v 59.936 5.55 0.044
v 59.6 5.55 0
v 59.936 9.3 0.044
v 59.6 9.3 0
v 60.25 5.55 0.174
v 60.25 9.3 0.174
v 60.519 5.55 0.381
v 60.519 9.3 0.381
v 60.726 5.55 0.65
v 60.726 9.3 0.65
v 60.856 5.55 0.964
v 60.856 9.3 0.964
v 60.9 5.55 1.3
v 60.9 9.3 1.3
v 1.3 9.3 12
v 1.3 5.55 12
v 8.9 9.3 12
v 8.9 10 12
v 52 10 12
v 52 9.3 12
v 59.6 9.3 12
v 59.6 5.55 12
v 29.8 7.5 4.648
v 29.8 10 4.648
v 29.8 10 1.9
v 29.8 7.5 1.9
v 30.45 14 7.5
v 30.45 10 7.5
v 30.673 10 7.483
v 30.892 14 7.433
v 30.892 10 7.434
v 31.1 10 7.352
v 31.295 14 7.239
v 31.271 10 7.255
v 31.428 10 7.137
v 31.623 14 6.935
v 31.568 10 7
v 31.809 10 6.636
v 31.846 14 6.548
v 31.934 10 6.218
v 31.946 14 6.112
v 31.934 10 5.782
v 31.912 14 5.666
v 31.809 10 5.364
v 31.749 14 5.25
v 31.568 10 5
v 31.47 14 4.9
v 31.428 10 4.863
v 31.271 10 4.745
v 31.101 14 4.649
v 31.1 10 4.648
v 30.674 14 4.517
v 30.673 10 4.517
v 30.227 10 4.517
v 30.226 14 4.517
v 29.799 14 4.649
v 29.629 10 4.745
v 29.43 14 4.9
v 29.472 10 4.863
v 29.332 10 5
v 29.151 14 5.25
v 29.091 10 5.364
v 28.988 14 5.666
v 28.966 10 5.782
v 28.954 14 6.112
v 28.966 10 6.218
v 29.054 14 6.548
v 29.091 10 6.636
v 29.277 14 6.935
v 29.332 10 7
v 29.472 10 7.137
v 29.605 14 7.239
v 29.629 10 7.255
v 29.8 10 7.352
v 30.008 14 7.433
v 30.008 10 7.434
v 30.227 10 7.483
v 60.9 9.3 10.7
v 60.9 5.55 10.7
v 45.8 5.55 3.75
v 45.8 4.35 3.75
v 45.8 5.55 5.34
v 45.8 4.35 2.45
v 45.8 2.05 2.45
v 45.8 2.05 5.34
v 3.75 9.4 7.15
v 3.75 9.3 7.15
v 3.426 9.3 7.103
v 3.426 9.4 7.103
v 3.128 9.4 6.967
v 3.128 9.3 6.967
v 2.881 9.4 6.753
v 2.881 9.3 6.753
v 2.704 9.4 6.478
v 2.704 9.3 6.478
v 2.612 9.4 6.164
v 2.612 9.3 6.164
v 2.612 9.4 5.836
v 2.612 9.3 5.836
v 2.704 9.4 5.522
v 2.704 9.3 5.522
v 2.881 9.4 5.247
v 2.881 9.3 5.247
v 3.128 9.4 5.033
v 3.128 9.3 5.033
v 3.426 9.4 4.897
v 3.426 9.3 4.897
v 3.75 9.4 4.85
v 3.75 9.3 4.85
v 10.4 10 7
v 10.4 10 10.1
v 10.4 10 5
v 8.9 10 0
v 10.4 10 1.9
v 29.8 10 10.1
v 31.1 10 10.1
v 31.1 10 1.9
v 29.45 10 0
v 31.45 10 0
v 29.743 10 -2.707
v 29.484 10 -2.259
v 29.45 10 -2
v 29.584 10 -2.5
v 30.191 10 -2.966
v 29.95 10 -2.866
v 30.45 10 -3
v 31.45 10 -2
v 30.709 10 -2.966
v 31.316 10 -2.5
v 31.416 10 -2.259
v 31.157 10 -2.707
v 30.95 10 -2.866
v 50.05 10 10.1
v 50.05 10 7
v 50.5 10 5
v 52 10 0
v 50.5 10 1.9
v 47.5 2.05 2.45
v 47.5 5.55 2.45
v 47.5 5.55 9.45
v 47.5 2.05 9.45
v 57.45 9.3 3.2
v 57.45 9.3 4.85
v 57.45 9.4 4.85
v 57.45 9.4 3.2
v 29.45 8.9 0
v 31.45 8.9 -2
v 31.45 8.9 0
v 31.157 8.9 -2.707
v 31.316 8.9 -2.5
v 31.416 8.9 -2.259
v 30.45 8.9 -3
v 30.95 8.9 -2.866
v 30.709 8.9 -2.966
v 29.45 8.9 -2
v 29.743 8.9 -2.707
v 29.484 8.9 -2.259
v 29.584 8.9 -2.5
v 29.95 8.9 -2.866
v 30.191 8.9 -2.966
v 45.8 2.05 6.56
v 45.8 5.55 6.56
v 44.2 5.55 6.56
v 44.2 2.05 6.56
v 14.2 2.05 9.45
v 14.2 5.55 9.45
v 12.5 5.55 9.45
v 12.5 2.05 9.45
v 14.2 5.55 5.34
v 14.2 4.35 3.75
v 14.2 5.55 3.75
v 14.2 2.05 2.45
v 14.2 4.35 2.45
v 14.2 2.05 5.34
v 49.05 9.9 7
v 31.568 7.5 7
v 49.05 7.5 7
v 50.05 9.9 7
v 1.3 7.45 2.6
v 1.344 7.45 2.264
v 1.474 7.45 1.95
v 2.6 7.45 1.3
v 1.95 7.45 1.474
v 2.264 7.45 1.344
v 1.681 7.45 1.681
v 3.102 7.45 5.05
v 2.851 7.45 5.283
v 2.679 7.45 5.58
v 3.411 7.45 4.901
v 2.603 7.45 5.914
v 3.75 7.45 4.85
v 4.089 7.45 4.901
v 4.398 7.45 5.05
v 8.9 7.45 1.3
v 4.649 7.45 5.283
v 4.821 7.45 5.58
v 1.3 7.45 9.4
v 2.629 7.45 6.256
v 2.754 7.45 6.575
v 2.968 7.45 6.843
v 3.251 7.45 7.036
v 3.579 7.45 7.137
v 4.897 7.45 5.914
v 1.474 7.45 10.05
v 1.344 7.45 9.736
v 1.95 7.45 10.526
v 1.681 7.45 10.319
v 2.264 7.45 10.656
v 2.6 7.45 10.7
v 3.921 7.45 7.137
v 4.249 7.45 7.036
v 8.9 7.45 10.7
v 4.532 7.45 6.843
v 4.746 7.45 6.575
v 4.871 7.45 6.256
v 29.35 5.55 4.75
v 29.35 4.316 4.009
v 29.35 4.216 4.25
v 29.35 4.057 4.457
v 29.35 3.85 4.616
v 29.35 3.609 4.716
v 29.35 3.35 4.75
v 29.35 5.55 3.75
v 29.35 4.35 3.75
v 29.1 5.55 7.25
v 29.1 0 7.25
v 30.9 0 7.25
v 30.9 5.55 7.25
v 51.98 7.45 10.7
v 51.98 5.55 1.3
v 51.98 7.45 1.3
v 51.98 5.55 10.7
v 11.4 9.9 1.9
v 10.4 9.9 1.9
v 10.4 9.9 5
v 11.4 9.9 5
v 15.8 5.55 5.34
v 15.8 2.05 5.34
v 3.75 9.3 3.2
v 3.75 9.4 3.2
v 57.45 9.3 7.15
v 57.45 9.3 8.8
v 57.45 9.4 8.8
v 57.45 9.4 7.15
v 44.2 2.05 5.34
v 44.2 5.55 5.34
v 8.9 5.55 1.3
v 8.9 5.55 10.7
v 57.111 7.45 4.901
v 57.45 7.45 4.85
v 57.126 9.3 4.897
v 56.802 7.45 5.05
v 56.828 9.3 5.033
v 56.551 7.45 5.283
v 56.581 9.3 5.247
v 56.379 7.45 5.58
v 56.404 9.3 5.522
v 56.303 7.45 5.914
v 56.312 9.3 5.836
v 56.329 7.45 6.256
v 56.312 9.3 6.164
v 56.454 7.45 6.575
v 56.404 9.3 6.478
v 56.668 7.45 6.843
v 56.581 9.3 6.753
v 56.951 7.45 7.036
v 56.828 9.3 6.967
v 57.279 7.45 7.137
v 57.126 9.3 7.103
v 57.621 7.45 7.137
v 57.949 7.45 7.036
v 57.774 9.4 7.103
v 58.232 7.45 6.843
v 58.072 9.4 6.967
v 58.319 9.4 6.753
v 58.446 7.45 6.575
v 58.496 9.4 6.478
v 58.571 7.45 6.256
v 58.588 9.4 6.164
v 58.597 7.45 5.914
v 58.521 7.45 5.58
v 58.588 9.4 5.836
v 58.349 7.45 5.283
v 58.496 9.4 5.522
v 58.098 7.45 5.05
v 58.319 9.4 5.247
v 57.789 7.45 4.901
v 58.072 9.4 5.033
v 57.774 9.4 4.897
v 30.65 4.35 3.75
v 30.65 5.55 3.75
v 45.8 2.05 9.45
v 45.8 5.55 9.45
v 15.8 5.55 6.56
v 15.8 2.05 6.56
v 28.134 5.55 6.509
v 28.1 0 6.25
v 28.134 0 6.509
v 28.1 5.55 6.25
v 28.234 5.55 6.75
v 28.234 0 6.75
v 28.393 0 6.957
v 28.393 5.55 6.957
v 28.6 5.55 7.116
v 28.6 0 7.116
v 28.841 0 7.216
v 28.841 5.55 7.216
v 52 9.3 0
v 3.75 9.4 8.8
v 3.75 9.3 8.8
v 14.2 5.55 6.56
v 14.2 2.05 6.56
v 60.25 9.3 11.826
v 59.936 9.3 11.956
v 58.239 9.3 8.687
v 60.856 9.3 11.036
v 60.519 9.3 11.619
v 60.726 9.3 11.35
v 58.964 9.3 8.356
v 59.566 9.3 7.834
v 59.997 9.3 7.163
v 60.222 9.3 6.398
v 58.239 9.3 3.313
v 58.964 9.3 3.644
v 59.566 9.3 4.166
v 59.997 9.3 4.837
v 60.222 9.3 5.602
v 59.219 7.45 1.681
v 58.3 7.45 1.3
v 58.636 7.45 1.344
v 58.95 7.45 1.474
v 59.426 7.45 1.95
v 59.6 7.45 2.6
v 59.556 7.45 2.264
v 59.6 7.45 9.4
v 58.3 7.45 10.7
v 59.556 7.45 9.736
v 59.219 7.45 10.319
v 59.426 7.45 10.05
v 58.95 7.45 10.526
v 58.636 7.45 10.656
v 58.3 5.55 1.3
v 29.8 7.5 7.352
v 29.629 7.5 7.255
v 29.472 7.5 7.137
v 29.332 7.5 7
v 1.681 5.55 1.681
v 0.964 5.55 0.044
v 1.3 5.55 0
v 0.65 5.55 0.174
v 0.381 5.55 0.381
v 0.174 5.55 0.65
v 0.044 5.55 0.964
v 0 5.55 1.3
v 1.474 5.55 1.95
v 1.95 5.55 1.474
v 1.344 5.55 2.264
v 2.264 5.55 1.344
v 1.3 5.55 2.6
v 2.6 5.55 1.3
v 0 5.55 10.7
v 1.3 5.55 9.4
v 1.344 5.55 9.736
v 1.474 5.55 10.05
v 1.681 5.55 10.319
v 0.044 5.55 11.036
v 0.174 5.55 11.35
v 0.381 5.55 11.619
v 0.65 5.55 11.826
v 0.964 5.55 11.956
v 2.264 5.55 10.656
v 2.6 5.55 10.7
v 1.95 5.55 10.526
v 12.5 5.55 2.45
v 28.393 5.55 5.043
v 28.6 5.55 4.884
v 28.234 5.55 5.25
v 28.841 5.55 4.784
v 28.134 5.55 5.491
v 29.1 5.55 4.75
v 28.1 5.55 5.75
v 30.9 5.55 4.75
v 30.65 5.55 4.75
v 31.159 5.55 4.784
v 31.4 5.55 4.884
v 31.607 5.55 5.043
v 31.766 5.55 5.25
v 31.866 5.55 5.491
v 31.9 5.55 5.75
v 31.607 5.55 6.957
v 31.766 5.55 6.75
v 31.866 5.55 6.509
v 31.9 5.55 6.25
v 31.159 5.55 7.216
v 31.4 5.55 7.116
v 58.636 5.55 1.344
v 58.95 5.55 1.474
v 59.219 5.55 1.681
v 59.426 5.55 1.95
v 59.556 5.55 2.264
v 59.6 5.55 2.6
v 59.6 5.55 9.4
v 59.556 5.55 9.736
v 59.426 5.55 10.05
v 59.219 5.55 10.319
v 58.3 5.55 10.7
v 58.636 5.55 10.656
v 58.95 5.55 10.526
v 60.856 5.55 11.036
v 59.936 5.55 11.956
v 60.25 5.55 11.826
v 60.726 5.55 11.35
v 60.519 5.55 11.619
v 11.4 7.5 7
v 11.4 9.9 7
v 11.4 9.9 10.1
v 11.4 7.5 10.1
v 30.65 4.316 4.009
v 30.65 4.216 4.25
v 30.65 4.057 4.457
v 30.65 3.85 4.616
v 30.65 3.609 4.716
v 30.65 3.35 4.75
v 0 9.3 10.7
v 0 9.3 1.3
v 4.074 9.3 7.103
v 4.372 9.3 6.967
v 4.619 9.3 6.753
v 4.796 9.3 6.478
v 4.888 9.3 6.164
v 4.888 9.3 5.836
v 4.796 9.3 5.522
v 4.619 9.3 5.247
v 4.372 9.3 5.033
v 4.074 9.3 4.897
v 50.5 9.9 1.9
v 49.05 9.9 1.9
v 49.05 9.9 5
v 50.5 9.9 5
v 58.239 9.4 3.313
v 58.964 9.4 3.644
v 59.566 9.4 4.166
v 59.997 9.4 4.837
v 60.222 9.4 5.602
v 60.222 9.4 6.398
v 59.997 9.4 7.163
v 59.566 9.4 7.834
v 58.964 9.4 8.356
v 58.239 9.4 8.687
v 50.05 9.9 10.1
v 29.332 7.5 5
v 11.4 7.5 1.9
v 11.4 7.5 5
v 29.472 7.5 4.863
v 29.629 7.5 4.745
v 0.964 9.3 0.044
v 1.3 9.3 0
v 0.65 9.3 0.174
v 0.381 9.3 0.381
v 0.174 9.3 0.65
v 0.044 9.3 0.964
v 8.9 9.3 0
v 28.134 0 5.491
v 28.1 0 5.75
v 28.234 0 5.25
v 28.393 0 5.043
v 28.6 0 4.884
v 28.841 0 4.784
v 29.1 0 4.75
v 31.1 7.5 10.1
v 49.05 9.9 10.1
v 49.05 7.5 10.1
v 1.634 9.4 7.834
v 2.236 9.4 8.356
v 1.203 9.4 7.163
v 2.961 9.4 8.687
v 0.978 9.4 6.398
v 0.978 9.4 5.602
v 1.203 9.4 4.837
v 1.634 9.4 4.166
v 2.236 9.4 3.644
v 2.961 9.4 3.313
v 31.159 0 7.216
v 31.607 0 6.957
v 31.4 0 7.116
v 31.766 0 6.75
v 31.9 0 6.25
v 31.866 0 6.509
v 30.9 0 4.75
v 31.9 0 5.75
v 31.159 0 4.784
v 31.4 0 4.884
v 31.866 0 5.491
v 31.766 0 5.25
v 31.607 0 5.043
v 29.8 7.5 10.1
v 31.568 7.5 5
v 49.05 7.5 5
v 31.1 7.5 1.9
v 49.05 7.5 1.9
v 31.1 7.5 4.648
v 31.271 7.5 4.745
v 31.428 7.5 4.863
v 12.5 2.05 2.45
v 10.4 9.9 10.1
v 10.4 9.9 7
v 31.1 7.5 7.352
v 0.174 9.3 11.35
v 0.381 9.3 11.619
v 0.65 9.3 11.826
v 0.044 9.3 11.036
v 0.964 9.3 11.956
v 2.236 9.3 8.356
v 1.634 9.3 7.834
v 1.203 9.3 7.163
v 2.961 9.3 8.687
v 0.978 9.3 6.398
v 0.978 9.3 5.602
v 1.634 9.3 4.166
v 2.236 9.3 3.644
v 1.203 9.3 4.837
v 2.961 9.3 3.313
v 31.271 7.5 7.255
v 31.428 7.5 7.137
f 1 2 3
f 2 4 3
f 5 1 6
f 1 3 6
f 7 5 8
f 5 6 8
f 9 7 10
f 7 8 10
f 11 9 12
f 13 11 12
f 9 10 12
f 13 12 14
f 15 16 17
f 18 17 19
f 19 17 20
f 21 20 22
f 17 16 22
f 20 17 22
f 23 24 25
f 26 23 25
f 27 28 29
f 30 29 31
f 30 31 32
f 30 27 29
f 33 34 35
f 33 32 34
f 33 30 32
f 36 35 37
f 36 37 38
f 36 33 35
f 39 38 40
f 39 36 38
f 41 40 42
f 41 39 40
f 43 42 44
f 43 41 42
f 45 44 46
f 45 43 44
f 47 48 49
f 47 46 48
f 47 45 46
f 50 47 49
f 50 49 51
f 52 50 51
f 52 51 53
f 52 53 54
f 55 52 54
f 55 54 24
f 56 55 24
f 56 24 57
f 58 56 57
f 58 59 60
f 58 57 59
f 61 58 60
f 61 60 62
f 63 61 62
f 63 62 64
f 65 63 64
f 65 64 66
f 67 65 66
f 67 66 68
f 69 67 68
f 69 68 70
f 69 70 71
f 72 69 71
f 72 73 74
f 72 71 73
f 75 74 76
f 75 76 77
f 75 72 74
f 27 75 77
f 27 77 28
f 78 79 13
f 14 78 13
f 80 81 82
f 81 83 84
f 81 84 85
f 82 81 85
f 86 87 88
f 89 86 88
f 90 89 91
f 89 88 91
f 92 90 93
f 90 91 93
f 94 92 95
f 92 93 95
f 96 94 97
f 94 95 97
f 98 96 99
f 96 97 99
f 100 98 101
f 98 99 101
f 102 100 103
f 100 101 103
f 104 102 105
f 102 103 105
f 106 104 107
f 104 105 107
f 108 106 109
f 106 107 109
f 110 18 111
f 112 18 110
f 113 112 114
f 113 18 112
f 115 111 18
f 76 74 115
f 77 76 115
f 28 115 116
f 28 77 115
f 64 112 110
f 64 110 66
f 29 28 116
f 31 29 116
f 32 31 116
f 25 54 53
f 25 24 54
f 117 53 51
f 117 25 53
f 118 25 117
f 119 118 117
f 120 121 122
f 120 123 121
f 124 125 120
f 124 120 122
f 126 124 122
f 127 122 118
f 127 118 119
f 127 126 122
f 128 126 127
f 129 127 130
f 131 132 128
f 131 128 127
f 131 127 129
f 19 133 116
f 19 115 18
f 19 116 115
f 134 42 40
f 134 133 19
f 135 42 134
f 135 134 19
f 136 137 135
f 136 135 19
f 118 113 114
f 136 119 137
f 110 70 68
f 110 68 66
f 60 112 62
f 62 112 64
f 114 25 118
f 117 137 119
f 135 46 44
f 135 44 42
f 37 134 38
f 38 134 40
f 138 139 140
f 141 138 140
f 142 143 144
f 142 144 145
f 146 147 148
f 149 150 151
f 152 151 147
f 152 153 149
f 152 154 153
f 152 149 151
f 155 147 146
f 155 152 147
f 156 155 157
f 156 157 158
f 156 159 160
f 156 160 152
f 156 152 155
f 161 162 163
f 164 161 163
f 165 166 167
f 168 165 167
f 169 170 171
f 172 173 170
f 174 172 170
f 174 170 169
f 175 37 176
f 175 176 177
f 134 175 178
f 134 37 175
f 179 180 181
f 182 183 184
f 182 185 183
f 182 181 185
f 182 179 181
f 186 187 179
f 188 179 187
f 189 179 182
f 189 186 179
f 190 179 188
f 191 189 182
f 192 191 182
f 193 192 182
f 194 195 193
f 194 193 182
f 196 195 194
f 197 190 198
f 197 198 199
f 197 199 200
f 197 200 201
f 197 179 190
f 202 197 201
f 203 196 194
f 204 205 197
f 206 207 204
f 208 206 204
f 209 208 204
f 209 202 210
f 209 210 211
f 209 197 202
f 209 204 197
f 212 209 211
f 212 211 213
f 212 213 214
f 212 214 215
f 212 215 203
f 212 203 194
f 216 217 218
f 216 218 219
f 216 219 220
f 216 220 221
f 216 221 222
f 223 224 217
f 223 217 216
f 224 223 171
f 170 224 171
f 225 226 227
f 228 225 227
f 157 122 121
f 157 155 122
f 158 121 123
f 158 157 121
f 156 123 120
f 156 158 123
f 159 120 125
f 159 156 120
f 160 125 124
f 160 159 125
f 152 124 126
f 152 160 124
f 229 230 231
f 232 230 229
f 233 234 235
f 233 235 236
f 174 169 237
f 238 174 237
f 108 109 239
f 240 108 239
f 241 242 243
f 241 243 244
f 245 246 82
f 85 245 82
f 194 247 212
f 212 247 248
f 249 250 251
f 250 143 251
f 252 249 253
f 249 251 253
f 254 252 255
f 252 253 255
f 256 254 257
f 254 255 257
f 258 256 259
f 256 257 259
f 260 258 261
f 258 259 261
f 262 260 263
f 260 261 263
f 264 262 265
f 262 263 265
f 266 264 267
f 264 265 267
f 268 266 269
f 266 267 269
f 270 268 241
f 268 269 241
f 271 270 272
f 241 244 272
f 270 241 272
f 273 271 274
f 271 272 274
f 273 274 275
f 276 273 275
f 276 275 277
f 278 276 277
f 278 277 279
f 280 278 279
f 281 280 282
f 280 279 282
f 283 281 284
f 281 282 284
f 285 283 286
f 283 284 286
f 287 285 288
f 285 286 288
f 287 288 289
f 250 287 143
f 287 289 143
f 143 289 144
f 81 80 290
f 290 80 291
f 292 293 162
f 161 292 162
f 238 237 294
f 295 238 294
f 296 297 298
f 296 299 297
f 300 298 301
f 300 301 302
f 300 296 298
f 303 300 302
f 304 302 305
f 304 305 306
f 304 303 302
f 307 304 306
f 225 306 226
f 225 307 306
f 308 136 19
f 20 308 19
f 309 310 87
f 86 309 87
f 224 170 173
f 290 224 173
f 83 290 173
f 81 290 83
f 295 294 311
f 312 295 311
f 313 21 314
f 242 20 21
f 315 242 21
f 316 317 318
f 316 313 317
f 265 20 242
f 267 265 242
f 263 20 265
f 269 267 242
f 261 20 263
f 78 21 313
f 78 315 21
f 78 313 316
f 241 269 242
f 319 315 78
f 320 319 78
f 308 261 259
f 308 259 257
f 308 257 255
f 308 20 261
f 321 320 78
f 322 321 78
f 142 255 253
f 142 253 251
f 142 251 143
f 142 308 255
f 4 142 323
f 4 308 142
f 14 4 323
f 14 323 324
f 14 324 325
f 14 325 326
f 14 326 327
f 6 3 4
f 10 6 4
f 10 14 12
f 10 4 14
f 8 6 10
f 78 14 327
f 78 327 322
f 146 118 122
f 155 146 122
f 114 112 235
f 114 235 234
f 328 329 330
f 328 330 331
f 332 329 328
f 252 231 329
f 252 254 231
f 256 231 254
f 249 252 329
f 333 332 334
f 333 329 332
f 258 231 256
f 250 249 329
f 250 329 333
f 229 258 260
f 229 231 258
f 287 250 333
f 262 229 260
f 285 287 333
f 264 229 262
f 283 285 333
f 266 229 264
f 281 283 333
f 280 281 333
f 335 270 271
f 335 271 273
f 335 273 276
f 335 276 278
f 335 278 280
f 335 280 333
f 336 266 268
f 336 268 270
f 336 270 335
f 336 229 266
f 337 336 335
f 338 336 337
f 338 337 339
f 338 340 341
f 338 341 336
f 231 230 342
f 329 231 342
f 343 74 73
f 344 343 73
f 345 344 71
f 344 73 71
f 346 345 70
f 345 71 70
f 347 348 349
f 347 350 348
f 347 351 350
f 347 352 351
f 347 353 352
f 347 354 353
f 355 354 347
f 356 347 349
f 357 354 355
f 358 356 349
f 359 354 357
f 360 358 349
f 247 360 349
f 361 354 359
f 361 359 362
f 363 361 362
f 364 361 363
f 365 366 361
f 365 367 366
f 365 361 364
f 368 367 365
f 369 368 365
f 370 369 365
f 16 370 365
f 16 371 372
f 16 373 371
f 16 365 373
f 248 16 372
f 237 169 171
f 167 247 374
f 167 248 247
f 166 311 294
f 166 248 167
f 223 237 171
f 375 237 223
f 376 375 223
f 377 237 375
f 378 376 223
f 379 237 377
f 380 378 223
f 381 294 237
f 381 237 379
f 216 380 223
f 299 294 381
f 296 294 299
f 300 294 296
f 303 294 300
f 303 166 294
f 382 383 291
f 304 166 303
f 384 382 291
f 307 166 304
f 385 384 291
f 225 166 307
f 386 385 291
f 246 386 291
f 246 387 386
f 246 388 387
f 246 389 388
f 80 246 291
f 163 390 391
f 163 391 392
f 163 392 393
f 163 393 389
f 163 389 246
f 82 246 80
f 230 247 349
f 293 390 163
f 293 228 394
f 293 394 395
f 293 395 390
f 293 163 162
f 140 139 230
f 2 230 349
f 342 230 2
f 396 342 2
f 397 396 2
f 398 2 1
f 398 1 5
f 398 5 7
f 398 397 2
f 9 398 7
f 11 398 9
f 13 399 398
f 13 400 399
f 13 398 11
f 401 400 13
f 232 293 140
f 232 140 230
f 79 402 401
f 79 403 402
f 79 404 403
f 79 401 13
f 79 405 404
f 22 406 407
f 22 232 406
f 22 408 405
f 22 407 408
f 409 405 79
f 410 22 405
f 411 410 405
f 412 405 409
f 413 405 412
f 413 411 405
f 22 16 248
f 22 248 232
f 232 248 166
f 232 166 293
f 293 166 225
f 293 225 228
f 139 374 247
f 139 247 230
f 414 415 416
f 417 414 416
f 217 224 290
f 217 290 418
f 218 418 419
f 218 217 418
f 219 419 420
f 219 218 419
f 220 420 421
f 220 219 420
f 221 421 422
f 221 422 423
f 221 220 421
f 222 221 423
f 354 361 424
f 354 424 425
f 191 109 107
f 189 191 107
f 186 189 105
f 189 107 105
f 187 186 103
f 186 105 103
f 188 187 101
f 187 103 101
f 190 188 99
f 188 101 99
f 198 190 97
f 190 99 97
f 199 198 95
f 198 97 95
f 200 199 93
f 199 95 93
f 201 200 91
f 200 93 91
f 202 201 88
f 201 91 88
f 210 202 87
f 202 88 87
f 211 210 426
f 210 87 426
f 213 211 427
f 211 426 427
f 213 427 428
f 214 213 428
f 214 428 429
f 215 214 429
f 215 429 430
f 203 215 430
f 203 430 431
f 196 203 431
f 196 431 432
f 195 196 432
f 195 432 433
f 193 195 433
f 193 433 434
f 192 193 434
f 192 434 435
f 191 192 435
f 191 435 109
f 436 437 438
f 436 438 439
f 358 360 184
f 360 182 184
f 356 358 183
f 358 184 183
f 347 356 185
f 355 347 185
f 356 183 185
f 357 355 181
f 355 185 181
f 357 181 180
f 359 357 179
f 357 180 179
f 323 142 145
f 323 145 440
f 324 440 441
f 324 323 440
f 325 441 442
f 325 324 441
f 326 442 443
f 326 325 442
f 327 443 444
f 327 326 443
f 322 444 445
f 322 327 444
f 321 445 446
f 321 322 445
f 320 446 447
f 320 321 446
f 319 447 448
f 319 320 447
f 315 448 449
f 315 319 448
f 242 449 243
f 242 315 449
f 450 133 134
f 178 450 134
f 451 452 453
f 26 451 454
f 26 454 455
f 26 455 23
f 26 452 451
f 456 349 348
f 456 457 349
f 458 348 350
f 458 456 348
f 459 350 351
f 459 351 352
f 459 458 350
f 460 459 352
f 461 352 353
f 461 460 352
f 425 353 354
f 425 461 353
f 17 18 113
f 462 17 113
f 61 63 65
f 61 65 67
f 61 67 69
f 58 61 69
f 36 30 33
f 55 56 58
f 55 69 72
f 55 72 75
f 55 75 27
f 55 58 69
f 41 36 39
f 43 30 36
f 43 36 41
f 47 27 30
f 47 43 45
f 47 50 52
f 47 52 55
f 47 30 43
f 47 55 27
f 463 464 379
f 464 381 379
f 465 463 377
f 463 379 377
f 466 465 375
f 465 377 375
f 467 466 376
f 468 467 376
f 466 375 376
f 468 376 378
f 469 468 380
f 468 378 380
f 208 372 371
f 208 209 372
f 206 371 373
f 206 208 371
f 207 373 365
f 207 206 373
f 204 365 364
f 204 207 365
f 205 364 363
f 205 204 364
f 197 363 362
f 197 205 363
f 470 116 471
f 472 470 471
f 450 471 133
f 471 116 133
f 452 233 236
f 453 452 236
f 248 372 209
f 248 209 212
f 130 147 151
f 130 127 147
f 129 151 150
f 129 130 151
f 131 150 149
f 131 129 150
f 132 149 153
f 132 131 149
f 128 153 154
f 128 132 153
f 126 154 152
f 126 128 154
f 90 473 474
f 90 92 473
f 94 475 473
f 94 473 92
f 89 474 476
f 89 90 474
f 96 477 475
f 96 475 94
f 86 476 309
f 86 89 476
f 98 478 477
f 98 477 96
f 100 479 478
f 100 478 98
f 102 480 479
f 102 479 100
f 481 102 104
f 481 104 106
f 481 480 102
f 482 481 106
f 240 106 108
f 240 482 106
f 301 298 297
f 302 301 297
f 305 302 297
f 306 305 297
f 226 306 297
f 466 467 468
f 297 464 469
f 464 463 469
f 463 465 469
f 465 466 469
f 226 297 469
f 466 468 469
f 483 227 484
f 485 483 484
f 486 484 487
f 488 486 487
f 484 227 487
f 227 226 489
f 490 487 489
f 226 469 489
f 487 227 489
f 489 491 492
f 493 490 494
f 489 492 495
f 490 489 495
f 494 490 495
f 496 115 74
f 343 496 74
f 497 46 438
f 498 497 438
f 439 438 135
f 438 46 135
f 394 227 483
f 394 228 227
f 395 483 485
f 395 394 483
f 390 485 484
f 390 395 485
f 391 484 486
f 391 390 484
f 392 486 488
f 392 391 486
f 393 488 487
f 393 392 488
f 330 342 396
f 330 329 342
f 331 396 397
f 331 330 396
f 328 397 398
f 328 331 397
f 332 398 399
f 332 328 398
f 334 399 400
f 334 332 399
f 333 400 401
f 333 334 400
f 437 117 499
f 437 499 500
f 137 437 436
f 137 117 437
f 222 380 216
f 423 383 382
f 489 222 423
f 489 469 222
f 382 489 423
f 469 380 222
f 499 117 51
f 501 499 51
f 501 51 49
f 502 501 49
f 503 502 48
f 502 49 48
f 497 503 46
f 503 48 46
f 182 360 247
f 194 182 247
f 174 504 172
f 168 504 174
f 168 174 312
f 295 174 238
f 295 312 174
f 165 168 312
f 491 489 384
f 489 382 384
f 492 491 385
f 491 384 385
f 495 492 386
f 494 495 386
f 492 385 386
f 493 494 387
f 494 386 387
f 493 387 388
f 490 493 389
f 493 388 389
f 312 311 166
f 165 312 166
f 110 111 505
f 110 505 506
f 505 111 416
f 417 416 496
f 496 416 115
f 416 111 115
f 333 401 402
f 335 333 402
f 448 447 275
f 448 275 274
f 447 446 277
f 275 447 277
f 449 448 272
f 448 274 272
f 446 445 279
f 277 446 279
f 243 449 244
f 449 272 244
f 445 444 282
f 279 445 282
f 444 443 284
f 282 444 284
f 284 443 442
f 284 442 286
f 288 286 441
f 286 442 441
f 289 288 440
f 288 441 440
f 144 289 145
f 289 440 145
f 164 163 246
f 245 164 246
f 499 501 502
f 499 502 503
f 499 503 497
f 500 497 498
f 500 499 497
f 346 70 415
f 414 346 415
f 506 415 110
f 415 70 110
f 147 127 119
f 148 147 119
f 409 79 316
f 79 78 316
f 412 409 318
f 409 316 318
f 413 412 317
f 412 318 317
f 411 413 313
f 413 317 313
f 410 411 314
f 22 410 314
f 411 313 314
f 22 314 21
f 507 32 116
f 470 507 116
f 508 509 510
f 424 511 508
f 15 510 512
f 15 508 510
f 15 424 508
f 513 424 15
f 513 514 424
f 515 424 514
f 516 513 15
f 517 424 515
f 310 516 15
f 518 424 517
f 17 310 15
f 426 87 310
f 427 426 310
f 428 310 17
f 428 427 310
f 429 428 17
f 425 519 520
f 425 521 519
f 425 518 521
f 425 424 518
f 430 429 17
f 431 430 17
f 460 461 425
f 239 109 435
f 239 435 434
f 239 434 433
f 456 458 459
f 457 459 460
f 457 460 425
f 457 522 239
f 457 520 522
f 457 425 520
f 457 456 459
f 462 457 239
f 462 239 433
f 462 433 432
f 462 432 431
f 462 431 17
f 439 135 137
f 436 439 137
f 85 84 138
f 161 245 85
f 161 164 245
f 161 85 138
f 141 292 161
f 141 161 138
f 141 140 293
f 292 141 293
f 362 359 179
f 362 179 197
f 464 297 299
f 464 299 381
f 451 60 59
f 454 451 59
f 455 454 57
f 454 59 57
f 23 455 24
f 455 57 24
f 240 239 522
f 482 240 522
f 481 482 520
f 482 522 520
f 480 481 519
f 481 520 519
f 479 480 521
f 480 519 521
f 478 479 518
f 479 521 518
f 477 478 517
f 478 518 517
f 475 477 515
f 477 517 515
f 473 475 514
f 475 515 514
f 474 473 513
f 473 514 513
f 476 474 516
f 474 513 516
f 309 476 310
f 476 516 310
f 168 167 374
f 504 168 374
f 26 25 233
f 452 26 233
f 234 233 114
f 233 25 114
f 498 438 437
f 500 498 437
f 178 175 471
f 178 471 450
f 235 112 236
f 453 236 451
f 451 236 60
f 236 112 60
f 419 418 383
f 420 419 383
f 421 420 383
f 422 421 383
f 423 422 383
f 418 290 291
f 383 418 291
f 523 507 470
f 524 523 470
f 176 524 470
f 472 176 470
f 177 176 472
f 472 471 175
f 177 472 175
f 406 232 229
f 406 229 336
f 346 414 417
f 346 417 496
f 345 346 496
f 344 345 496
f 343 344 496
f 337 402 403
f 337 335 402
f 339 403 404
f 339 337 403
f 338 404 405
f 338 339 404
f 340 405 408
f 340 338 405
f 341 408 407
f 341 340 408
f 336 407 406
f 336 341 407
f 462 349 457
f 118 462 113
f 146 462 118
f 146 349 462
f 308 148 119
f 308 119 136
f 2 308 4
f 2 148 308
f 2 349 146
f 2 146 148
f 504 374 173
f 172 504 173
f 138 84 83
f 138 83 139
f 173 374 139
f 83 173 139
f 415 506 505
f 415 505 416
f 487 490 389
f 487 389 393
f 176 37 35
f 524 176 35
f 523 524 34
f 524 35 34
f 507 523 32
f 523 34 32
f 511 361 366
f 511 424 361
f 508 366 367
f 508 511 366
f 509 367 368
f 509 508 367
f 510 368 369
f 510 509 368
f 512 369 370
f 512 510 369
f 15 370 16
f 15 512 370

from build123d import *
from build123d.topology import SkipClean

# Parameters (mm, degrees)
CROQUIS1_W              = 60.9
CROQUIS1_H              = 12
SALIENTE_EXTRUIR1_DEPTH = 14
CROQUIS2_OUTSIDE_W      = 75.626
CROQUIS2_OUTSIDE_H      = 26.726
CROQUIS2_OUTSIDE_R      = 1.5
CORTAR_EXTRUIR1_DEPTH   = 4
SALIENTE_EXTRUIR3_DEPTH = 1.1
CROQUIS4_OUTSIDE_W      = 75.752
CROQUIS4_OUTSIDE_H      = 29.852
CORTAR_EXTRUIR2_DEPTH   = 0.7
CORTAR_EXTRUIR3_DEPTH   = 2.5
CROQUIS6_W              = 1.45
CROQUIS6_H              = 3.1
CROQUIS6_W_2            = 1
CORTAR_EXTRUIR4_DEPTH   = 0.1
REDONDEO1_R             = 1
REDONDEO2_R             = 1
SALIENTE_EXTRUIR4_DEPTH = 0.1
CORTAR_EXTRUIR5_REACH   = 64.764
CROQUIS8_R              = 1.15
CROQUIS9_OUTSIDE_W      = 75.752
CROQUIS9_OUTSIDE_H      = 29.852
CORTAR_EXTRUIR7_DEPTH   = 5.55
SALIENTE_EXTRUIR6_DEPTH = 3.5
CROQUIS12_W             = 31.6
CROQUIS12_H             = 1.3
CORTAR_EXTRUIR8_DEPTH   = 2.3
CROQUIS14_W             = 1.3
CROQUIS14_H             = 1
CORTAR_EXTRUIR9_DEPTH   = 2.3
REDONDEO3_R             = 1
CROQUIS15_W             = 7.62
CROQUIS15_H             = 9.4
CROQUIS15_W_2           = 7.6
CORTAR_EXTRUIR10_DEPTH  = 1.9
REDONDEO4_R             = 1.3
REDONDEO5_R             = 1.3
REDONDEO6_R             = 1.3
REDONDEO7_R             = 1


# Some blends are built 0.0001 mm under size
with BuildPart() as part:
    # Croquis1 → Saliente-Extruir1 (new body)
    with BuildSketch(Plane(origin=(0, 0, 0), x_dir=(1, 0, 0), z_dir=(0, 1, 0))):
        with Locations((30.45, -6)):
            Rectangle(CROQUIS1_W, CROQUIS1_H)
    extrude(amount=SALIENTE_EXTRUIR1_DEPTH)

    # Croquis2 outside → Cortar-Extruir1 (cut)
    with BuildSketch(Plane(origin=(0, 14, 0), x_dir=(1, 0, 0), z_dir=(0, 1, 0))):
        with Locations((30.45, -6)):
            Rectangle(CROQUIS2_OUTSIDE_W, CROQUIS2_OUTSIDE_H)
        with Locations(Location((30.45, -6, 0), (0, 0, 270))):
            Circle(CROQUIS2_OUTSIDE_R, mode=Mode.SUBTRACT)
    extrude(amount=-CORTAR_EXTRUIR1_DEPTH, mode=Mode.SUBTRACT)

    # Croquis3 → Saliente-Extruir3 (add)
    with BuildSketch(Plane(origin=(0, 10, 0), x_dir=(1, 0, 0), z_dir=(0, 1, 0))):
        Polygon((30.45, 0), (29.45, 0), (29.45, 3), (31.45, 3), (31.45, 0), align=None)
    extrude(amount=-SALIENTE_EXTRUIR3_DEPTH)

    # Croquis4 outside → Cortar-Extruir2 (cut)
    with BuildSketch(Plane(origin=(0, 10, 0), x_dir=(1, 0, 0), z_dir=(0, 1, 0))):
        with Locations((30.45, -4.5)):
            Rectangle(CROQUIS4_OUTSIDE_W, CROQUIS4_OUTSIDE_H)
        Polygon((8.9, -6), (8.9, 0), (29.45, 0), (29.45, 3), (31.45, 3), (31.45, 0), (52, 0), (52, -12), (8.9, -12), align=None, mode=Mode.SUBTRACT)
    extrude(amount=-CORTAR_EXTRUIR2_DEPTH, mode=Mode.SUBTRACT)

    # Croquis5 → Cortar-Extruir3 (cut)
    with SkipClean():  # the faces are left unmerged after this step: merging them gives an invalid solid
        with BuildSketch(Plane(origin=(0, 10, 0), x_dir=(1, 0, 0), z_dir=(0, 1, 0))):
            with BuildLine():
                ThreePointArc((29.331966011, -5), (29.548647819, -4.801015327), (29.8, -4.648149417))
                Line((29.8, -4.648149417), (29.8, -1.9))
                Line((29.8, -1.9), (11.4, -1.9))
                Line((11.4, -1.9), (11.4, -5))
                Line((11.4, -5), (29.331966011, -5))
            make_face()
            with BuildLine():
                ThreePointArc((29.8, -7.351850583), (29.548647819, -7.198984673), (29.331966011, -7))
                Line((29.331966011, -7), (11.4, -7))
                Line((11.4, -7), (11.4, -10.1))
                Line((11.4, -10.1), (29.8, -10.1))
                Line((29.8, -10.1), (29.8, -7.351850583))
            make_face()
            with BuildLine():
                Line((49.05, -7), (31.568033989, -7))
                ThreePointArc((31.568033989, -7), (31.351352181, -7.198984673), (31.1, -7.351850583))
                Line((31.1, -7.351850583), (31.1, -10.1))
                Line((31.1, -10.1), (49.05, -10.1))
                Line((49.05, -10.1), (49.05, -7))
            make_face()
            with BuildLine():
                Line((49.05, -5), (49.05, -1.9))
                Line((49.05, -1.9), (31.1, -1.9))
                Line((31.1, -1.9), (31.1, -4.648149417))
                ThreePointArc((31.1, -4.648149417), (31.351352181, -4.801015327), (31.568033989, -5))
                Line((31.568033989, -5), (49.05, -5))
            make_face()
        extrude(amount=-CORTAR_EXTRUIR3_DEPTH, mode=Mode.SUBTRACT)

    # Croquis6 → Cortar-Extruir4 (cut)
    with SkipClean():  # the faces are left unmerged after this step: merging them gives an invalid solid
        with BuildSketch(Plane(origin=(0, 10, 0), x_dir=(1, 0, 0), z_dir=(0, 1, 0))):
            with Locations((49.775, -3.45)):
                Rectangle(CROQUIS6_W, CROQUIS6_H)
            with Locations((49.55, -8.55)):
                Rectangle(CROQUIS6_W_2, CROQUIS6_H)
            with Locations((10.9, -3.45)):
                Rectangle(CROQUIS6_W_2, CROQUIS6_H)
            with Locations((10.9, -8.55)):
                Rectangle(CROQUIS6_W_2, CROQUIS6_H)
        extrude(amount=-CORTAR_EXTRUIR4_DEPTH, mode=Mode.SUBTRACT)

    # Redondeo1
    redondeo1_edges = [part.edges().sort_by_distance(p)[0] for p in [
        (31.45, 9.45, -3),
    ]]
    fillet(redondeo1_edges, radius=REDONDEO1_R)

    # Redondeo2
    redondeo2_edges = [part.edges().sort_by_distance(p)[0] for p in [
        (29.45, 9.45, -3),
    ]]
    fillet(redondeo2_edges, radius=REDONDEO2_R - 0.0001)  # a hair under: the kernel refuses the full size

    # Croquis7 → Saliente-Extruir4 (add)
    with BuildSketch(Plane(origin=(0, 9.3, 0), x_dir=(1, 0, 0), z_dir=(0, 1, 0))):
        with BuildLine():
            Line((57.45, -8.8), (57.45, -7.15))
            ThreePointArc((57.45, -7.15), (58.6, -6), (57.45, -4.85))
            Line((57.45, -4.85), (57.45, -3.2))
            ThreePointArc((57.45, -3.2), (60.25, -6), (57.45, -8.8))
        make_face()
        with BuildLine():
            Line((3.75, -4.85), (3.75, -3.2))
            ThreePointArc((3.75, -3.2), (0.95, -6), (3.75, -8.8))
            Line((3.75, -8.8), (3.75, -7.15))
            ThreePointArc((3.75, -7.15), (2.6, -6), (3.75, -4.85))
        make_face()
    extrude(amount=SALIENTE_EXTRUIR4_DEPTH)

    # Croquis8 → Cortar-Extruir5 (cut, up to next)
    with BuildSketch(Plane(origin=(0, 9.3, 0), x_dir=(1, 0, 0), z_dir=(0, 1, 0)), mode=Mode.PRIVATE) as cortar_extruir5_sk1:
        with Locations(Location((57.45, -6, 0), (0, 0, 90))):
            Circle(CROQUIS8_R)
    cortar_extruir5_tool1 = extrude(cortar_extruir5_sk1.sketch, amount=-CORTAR_EXTRUIR5_REACH, mode=Mode.PRIVATE) & part.part
    # Croquis8 → Cortar-Extruir5 (cut, up to next)
    with BuildSketch(Plane(origin=(0, 9.3, 0), x_dir=(1, 0, 0), z_dir=(0, 1, 0)), mode=Mode.PRIVATE) as cortar_extruir5_sk2:
        with Locations(Location((3.75, -6, 0), (0, 0, 90))):
            Circle(CROQUIS8_R)
    cortar_extruir5_tool2 = extrude(cortar_extruir5_sk2.sketch, amount=-CORTAR_EXTRUIR5_REACH, mode=Mode.PRIVATE) & part.part
    add(cortar_extruir5_tool1.solids().sort_by_distance((57.45, 9.3, 6))[0], mode=Mode.SUBTRACT)
    add(cortar_extruir5_tool2.solids().sort_by_distance((3.75, 9.3, 6))[0], mode=Mode.SUBTRACT)

    # Croquis9 outside → Cortar-Extruir7 (cut)
    with BuildSketch(Plane.XZ):
        with Locations((30.45, 4.5)):
            Rectangle(CROQUIS9_OUTSIDE_W, CROQUIS9_OUTSIDE_H)
        Polygon((30, 7.25), (28.1, 7.25), (28.1, 4.75), (31.9, 4.75), (31.9, 7.25), align=None, mode=Mode.SUBTRACT)
    extrude(amount=-CORTAR_EXTRUIR7_DEPTH, mode=Mode.SUBTRACT)

    # Croquis10 → Saliente-Extruir6 (add)
    with BuildSketch(Plane.XZ.offset(-5.55)):
        Polygon((30.65, 4.75), (29.35, 4.75), (29.35, 3.75), (14.2, 3.75), (14.2, 5.34), (15.8, 5.34), (15.8, 5.95), (15.8, 6.56), (14.2, 6.56), (14.2, 9.45), (12.5, 9.45), (12.5, 2.45), (29.35, 2.45), (30, 2.45), (30.65, 2.45), (47.5, 2.45), (47.5, 9.45), (45.8, 9.45), (45.8, 6.56), (44.2, 6.56), (44.2, 5.95), (44.2, 5.34), (45.8, 5.34), (45.8, 3.75), (30.65, 3.75), align=None)
    extrude(amount=SALIENTE_EXTRUIR6_DEPTH)

    # Croquis12 → Cortar-Extruir8 (cut)
    with BuildSketch(Plane.XZ.offset(-2.05)):
        with Locations((30, 3.1)):
            Rectangle(CROQUIS12_W, CROQUIS12_H)
    extrude(amount=-CORTAR_EXTRUIR8_DEPTH, mode=Mode.SUBTRACT)

    # Croquis14 → Cortar-Extruir9 (cut)
    with BuildSketch(Plane.XZ.offset(-2.05)):
        with Locations((30, 4.25)):
            Rectangle(CROQUIS14_W, CROQUIS14_H)
    extrude(amount=-CORTAR_EXTRUIR9_DEPTH, mode=Mode.SUBTRACT)

    # Redondeo3
    # the kernel refuses this fillet: 1 mm, written as the material it adds along each edge
    with BuildSketch(Plane(origin=(29.35, 4.35, 4.75), x_dir=(0, -1, 0), z_dir=(1, 0, 0))) as redondeo3_piece_1:
        with BuildLine():
            CenterArc((REDONDEO3_R, REDONDEO3_R), REDONDEO3_R, 180, 90)
            Line((0, REDONDEO3_R), (0, 0))
            Line((0, 0), (REDONDEO3_R, 0))
        make_face()
    extrude(amount=1.3)

    # Croquis15 → Cortar-Extruir10 (cut)
    with BuildSketch(Plane.XZ.offset(-5.55)):
        with Locations((55.79, 6)):
            Rectangle(CROQUIS15_W, CROQUIS15_H)
        with Locations((5.1, 6)):
            Rectangle(CROQUIS15_W_2, CROQUIS15_H)
    extrude(amount=-CORTAR_EXTRUIR10_DEPTH, mode=Mode.SUBTRACT)

    # Redondeo4
    redondeo4_edges = [part.edges().sort_by_distance(p)[0] for p in [
        (60.9, 7.425, 0),
    ]]
    fillet(redondeo4_edges, radius=REDONDEO4_R)

    # Redondeo5
    redondeo5_edges = [part.edges().sort_by_distance(p)[0] for p in [
        (60.9, 7.425, 12),
        (0, 7.425, 12),
        (0, 7.425, 0),
    ]]
    fillet(redondeo5_edges, radius=REDONDEO5_R)

    # Redondeo6
    redondeo6_edges = [part.edges().sort_by_distance(p)[0] for p in [
        (59.6, 6.5, 10.7),
        (59.6, 6.5, 1.3),
        (1.3, 6.5, 1.3),
        (1.3, 6.5, 10.7),
    ]]
    fillet(redondeo6_edges, radius=REDONDEO6_R)

    # Redondeo7
    redondeo7_edges = [part.edges().sort_by_distance(p)[0] for p in [
        (31.9, 2.775, 4.75),
        (28.1, 2.775, 4.75),
        (28.1, 2.775, 7.25),
        (31.9, 2.775, 7.25),
    ]]
    fillet(redondeo7_edges, radius=REDONDEO7_R)


solid = part.part
